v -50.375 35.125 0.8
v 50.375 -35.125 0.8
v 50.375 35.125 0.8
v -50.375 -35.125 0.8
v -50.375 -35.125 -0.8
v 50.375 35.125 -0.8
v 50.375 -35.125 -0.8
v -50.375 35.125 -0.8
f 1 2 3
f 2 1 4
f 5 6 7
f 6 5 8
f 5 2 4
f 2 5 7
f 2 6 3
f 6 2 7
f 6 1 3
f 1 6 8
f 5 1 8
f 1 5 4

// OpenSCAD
$fn=64;

module mainboard(length=100.75, width=70.25, thickness=1.6) {
    cube([length, width, thickness], center=true);
}

mainboard();
